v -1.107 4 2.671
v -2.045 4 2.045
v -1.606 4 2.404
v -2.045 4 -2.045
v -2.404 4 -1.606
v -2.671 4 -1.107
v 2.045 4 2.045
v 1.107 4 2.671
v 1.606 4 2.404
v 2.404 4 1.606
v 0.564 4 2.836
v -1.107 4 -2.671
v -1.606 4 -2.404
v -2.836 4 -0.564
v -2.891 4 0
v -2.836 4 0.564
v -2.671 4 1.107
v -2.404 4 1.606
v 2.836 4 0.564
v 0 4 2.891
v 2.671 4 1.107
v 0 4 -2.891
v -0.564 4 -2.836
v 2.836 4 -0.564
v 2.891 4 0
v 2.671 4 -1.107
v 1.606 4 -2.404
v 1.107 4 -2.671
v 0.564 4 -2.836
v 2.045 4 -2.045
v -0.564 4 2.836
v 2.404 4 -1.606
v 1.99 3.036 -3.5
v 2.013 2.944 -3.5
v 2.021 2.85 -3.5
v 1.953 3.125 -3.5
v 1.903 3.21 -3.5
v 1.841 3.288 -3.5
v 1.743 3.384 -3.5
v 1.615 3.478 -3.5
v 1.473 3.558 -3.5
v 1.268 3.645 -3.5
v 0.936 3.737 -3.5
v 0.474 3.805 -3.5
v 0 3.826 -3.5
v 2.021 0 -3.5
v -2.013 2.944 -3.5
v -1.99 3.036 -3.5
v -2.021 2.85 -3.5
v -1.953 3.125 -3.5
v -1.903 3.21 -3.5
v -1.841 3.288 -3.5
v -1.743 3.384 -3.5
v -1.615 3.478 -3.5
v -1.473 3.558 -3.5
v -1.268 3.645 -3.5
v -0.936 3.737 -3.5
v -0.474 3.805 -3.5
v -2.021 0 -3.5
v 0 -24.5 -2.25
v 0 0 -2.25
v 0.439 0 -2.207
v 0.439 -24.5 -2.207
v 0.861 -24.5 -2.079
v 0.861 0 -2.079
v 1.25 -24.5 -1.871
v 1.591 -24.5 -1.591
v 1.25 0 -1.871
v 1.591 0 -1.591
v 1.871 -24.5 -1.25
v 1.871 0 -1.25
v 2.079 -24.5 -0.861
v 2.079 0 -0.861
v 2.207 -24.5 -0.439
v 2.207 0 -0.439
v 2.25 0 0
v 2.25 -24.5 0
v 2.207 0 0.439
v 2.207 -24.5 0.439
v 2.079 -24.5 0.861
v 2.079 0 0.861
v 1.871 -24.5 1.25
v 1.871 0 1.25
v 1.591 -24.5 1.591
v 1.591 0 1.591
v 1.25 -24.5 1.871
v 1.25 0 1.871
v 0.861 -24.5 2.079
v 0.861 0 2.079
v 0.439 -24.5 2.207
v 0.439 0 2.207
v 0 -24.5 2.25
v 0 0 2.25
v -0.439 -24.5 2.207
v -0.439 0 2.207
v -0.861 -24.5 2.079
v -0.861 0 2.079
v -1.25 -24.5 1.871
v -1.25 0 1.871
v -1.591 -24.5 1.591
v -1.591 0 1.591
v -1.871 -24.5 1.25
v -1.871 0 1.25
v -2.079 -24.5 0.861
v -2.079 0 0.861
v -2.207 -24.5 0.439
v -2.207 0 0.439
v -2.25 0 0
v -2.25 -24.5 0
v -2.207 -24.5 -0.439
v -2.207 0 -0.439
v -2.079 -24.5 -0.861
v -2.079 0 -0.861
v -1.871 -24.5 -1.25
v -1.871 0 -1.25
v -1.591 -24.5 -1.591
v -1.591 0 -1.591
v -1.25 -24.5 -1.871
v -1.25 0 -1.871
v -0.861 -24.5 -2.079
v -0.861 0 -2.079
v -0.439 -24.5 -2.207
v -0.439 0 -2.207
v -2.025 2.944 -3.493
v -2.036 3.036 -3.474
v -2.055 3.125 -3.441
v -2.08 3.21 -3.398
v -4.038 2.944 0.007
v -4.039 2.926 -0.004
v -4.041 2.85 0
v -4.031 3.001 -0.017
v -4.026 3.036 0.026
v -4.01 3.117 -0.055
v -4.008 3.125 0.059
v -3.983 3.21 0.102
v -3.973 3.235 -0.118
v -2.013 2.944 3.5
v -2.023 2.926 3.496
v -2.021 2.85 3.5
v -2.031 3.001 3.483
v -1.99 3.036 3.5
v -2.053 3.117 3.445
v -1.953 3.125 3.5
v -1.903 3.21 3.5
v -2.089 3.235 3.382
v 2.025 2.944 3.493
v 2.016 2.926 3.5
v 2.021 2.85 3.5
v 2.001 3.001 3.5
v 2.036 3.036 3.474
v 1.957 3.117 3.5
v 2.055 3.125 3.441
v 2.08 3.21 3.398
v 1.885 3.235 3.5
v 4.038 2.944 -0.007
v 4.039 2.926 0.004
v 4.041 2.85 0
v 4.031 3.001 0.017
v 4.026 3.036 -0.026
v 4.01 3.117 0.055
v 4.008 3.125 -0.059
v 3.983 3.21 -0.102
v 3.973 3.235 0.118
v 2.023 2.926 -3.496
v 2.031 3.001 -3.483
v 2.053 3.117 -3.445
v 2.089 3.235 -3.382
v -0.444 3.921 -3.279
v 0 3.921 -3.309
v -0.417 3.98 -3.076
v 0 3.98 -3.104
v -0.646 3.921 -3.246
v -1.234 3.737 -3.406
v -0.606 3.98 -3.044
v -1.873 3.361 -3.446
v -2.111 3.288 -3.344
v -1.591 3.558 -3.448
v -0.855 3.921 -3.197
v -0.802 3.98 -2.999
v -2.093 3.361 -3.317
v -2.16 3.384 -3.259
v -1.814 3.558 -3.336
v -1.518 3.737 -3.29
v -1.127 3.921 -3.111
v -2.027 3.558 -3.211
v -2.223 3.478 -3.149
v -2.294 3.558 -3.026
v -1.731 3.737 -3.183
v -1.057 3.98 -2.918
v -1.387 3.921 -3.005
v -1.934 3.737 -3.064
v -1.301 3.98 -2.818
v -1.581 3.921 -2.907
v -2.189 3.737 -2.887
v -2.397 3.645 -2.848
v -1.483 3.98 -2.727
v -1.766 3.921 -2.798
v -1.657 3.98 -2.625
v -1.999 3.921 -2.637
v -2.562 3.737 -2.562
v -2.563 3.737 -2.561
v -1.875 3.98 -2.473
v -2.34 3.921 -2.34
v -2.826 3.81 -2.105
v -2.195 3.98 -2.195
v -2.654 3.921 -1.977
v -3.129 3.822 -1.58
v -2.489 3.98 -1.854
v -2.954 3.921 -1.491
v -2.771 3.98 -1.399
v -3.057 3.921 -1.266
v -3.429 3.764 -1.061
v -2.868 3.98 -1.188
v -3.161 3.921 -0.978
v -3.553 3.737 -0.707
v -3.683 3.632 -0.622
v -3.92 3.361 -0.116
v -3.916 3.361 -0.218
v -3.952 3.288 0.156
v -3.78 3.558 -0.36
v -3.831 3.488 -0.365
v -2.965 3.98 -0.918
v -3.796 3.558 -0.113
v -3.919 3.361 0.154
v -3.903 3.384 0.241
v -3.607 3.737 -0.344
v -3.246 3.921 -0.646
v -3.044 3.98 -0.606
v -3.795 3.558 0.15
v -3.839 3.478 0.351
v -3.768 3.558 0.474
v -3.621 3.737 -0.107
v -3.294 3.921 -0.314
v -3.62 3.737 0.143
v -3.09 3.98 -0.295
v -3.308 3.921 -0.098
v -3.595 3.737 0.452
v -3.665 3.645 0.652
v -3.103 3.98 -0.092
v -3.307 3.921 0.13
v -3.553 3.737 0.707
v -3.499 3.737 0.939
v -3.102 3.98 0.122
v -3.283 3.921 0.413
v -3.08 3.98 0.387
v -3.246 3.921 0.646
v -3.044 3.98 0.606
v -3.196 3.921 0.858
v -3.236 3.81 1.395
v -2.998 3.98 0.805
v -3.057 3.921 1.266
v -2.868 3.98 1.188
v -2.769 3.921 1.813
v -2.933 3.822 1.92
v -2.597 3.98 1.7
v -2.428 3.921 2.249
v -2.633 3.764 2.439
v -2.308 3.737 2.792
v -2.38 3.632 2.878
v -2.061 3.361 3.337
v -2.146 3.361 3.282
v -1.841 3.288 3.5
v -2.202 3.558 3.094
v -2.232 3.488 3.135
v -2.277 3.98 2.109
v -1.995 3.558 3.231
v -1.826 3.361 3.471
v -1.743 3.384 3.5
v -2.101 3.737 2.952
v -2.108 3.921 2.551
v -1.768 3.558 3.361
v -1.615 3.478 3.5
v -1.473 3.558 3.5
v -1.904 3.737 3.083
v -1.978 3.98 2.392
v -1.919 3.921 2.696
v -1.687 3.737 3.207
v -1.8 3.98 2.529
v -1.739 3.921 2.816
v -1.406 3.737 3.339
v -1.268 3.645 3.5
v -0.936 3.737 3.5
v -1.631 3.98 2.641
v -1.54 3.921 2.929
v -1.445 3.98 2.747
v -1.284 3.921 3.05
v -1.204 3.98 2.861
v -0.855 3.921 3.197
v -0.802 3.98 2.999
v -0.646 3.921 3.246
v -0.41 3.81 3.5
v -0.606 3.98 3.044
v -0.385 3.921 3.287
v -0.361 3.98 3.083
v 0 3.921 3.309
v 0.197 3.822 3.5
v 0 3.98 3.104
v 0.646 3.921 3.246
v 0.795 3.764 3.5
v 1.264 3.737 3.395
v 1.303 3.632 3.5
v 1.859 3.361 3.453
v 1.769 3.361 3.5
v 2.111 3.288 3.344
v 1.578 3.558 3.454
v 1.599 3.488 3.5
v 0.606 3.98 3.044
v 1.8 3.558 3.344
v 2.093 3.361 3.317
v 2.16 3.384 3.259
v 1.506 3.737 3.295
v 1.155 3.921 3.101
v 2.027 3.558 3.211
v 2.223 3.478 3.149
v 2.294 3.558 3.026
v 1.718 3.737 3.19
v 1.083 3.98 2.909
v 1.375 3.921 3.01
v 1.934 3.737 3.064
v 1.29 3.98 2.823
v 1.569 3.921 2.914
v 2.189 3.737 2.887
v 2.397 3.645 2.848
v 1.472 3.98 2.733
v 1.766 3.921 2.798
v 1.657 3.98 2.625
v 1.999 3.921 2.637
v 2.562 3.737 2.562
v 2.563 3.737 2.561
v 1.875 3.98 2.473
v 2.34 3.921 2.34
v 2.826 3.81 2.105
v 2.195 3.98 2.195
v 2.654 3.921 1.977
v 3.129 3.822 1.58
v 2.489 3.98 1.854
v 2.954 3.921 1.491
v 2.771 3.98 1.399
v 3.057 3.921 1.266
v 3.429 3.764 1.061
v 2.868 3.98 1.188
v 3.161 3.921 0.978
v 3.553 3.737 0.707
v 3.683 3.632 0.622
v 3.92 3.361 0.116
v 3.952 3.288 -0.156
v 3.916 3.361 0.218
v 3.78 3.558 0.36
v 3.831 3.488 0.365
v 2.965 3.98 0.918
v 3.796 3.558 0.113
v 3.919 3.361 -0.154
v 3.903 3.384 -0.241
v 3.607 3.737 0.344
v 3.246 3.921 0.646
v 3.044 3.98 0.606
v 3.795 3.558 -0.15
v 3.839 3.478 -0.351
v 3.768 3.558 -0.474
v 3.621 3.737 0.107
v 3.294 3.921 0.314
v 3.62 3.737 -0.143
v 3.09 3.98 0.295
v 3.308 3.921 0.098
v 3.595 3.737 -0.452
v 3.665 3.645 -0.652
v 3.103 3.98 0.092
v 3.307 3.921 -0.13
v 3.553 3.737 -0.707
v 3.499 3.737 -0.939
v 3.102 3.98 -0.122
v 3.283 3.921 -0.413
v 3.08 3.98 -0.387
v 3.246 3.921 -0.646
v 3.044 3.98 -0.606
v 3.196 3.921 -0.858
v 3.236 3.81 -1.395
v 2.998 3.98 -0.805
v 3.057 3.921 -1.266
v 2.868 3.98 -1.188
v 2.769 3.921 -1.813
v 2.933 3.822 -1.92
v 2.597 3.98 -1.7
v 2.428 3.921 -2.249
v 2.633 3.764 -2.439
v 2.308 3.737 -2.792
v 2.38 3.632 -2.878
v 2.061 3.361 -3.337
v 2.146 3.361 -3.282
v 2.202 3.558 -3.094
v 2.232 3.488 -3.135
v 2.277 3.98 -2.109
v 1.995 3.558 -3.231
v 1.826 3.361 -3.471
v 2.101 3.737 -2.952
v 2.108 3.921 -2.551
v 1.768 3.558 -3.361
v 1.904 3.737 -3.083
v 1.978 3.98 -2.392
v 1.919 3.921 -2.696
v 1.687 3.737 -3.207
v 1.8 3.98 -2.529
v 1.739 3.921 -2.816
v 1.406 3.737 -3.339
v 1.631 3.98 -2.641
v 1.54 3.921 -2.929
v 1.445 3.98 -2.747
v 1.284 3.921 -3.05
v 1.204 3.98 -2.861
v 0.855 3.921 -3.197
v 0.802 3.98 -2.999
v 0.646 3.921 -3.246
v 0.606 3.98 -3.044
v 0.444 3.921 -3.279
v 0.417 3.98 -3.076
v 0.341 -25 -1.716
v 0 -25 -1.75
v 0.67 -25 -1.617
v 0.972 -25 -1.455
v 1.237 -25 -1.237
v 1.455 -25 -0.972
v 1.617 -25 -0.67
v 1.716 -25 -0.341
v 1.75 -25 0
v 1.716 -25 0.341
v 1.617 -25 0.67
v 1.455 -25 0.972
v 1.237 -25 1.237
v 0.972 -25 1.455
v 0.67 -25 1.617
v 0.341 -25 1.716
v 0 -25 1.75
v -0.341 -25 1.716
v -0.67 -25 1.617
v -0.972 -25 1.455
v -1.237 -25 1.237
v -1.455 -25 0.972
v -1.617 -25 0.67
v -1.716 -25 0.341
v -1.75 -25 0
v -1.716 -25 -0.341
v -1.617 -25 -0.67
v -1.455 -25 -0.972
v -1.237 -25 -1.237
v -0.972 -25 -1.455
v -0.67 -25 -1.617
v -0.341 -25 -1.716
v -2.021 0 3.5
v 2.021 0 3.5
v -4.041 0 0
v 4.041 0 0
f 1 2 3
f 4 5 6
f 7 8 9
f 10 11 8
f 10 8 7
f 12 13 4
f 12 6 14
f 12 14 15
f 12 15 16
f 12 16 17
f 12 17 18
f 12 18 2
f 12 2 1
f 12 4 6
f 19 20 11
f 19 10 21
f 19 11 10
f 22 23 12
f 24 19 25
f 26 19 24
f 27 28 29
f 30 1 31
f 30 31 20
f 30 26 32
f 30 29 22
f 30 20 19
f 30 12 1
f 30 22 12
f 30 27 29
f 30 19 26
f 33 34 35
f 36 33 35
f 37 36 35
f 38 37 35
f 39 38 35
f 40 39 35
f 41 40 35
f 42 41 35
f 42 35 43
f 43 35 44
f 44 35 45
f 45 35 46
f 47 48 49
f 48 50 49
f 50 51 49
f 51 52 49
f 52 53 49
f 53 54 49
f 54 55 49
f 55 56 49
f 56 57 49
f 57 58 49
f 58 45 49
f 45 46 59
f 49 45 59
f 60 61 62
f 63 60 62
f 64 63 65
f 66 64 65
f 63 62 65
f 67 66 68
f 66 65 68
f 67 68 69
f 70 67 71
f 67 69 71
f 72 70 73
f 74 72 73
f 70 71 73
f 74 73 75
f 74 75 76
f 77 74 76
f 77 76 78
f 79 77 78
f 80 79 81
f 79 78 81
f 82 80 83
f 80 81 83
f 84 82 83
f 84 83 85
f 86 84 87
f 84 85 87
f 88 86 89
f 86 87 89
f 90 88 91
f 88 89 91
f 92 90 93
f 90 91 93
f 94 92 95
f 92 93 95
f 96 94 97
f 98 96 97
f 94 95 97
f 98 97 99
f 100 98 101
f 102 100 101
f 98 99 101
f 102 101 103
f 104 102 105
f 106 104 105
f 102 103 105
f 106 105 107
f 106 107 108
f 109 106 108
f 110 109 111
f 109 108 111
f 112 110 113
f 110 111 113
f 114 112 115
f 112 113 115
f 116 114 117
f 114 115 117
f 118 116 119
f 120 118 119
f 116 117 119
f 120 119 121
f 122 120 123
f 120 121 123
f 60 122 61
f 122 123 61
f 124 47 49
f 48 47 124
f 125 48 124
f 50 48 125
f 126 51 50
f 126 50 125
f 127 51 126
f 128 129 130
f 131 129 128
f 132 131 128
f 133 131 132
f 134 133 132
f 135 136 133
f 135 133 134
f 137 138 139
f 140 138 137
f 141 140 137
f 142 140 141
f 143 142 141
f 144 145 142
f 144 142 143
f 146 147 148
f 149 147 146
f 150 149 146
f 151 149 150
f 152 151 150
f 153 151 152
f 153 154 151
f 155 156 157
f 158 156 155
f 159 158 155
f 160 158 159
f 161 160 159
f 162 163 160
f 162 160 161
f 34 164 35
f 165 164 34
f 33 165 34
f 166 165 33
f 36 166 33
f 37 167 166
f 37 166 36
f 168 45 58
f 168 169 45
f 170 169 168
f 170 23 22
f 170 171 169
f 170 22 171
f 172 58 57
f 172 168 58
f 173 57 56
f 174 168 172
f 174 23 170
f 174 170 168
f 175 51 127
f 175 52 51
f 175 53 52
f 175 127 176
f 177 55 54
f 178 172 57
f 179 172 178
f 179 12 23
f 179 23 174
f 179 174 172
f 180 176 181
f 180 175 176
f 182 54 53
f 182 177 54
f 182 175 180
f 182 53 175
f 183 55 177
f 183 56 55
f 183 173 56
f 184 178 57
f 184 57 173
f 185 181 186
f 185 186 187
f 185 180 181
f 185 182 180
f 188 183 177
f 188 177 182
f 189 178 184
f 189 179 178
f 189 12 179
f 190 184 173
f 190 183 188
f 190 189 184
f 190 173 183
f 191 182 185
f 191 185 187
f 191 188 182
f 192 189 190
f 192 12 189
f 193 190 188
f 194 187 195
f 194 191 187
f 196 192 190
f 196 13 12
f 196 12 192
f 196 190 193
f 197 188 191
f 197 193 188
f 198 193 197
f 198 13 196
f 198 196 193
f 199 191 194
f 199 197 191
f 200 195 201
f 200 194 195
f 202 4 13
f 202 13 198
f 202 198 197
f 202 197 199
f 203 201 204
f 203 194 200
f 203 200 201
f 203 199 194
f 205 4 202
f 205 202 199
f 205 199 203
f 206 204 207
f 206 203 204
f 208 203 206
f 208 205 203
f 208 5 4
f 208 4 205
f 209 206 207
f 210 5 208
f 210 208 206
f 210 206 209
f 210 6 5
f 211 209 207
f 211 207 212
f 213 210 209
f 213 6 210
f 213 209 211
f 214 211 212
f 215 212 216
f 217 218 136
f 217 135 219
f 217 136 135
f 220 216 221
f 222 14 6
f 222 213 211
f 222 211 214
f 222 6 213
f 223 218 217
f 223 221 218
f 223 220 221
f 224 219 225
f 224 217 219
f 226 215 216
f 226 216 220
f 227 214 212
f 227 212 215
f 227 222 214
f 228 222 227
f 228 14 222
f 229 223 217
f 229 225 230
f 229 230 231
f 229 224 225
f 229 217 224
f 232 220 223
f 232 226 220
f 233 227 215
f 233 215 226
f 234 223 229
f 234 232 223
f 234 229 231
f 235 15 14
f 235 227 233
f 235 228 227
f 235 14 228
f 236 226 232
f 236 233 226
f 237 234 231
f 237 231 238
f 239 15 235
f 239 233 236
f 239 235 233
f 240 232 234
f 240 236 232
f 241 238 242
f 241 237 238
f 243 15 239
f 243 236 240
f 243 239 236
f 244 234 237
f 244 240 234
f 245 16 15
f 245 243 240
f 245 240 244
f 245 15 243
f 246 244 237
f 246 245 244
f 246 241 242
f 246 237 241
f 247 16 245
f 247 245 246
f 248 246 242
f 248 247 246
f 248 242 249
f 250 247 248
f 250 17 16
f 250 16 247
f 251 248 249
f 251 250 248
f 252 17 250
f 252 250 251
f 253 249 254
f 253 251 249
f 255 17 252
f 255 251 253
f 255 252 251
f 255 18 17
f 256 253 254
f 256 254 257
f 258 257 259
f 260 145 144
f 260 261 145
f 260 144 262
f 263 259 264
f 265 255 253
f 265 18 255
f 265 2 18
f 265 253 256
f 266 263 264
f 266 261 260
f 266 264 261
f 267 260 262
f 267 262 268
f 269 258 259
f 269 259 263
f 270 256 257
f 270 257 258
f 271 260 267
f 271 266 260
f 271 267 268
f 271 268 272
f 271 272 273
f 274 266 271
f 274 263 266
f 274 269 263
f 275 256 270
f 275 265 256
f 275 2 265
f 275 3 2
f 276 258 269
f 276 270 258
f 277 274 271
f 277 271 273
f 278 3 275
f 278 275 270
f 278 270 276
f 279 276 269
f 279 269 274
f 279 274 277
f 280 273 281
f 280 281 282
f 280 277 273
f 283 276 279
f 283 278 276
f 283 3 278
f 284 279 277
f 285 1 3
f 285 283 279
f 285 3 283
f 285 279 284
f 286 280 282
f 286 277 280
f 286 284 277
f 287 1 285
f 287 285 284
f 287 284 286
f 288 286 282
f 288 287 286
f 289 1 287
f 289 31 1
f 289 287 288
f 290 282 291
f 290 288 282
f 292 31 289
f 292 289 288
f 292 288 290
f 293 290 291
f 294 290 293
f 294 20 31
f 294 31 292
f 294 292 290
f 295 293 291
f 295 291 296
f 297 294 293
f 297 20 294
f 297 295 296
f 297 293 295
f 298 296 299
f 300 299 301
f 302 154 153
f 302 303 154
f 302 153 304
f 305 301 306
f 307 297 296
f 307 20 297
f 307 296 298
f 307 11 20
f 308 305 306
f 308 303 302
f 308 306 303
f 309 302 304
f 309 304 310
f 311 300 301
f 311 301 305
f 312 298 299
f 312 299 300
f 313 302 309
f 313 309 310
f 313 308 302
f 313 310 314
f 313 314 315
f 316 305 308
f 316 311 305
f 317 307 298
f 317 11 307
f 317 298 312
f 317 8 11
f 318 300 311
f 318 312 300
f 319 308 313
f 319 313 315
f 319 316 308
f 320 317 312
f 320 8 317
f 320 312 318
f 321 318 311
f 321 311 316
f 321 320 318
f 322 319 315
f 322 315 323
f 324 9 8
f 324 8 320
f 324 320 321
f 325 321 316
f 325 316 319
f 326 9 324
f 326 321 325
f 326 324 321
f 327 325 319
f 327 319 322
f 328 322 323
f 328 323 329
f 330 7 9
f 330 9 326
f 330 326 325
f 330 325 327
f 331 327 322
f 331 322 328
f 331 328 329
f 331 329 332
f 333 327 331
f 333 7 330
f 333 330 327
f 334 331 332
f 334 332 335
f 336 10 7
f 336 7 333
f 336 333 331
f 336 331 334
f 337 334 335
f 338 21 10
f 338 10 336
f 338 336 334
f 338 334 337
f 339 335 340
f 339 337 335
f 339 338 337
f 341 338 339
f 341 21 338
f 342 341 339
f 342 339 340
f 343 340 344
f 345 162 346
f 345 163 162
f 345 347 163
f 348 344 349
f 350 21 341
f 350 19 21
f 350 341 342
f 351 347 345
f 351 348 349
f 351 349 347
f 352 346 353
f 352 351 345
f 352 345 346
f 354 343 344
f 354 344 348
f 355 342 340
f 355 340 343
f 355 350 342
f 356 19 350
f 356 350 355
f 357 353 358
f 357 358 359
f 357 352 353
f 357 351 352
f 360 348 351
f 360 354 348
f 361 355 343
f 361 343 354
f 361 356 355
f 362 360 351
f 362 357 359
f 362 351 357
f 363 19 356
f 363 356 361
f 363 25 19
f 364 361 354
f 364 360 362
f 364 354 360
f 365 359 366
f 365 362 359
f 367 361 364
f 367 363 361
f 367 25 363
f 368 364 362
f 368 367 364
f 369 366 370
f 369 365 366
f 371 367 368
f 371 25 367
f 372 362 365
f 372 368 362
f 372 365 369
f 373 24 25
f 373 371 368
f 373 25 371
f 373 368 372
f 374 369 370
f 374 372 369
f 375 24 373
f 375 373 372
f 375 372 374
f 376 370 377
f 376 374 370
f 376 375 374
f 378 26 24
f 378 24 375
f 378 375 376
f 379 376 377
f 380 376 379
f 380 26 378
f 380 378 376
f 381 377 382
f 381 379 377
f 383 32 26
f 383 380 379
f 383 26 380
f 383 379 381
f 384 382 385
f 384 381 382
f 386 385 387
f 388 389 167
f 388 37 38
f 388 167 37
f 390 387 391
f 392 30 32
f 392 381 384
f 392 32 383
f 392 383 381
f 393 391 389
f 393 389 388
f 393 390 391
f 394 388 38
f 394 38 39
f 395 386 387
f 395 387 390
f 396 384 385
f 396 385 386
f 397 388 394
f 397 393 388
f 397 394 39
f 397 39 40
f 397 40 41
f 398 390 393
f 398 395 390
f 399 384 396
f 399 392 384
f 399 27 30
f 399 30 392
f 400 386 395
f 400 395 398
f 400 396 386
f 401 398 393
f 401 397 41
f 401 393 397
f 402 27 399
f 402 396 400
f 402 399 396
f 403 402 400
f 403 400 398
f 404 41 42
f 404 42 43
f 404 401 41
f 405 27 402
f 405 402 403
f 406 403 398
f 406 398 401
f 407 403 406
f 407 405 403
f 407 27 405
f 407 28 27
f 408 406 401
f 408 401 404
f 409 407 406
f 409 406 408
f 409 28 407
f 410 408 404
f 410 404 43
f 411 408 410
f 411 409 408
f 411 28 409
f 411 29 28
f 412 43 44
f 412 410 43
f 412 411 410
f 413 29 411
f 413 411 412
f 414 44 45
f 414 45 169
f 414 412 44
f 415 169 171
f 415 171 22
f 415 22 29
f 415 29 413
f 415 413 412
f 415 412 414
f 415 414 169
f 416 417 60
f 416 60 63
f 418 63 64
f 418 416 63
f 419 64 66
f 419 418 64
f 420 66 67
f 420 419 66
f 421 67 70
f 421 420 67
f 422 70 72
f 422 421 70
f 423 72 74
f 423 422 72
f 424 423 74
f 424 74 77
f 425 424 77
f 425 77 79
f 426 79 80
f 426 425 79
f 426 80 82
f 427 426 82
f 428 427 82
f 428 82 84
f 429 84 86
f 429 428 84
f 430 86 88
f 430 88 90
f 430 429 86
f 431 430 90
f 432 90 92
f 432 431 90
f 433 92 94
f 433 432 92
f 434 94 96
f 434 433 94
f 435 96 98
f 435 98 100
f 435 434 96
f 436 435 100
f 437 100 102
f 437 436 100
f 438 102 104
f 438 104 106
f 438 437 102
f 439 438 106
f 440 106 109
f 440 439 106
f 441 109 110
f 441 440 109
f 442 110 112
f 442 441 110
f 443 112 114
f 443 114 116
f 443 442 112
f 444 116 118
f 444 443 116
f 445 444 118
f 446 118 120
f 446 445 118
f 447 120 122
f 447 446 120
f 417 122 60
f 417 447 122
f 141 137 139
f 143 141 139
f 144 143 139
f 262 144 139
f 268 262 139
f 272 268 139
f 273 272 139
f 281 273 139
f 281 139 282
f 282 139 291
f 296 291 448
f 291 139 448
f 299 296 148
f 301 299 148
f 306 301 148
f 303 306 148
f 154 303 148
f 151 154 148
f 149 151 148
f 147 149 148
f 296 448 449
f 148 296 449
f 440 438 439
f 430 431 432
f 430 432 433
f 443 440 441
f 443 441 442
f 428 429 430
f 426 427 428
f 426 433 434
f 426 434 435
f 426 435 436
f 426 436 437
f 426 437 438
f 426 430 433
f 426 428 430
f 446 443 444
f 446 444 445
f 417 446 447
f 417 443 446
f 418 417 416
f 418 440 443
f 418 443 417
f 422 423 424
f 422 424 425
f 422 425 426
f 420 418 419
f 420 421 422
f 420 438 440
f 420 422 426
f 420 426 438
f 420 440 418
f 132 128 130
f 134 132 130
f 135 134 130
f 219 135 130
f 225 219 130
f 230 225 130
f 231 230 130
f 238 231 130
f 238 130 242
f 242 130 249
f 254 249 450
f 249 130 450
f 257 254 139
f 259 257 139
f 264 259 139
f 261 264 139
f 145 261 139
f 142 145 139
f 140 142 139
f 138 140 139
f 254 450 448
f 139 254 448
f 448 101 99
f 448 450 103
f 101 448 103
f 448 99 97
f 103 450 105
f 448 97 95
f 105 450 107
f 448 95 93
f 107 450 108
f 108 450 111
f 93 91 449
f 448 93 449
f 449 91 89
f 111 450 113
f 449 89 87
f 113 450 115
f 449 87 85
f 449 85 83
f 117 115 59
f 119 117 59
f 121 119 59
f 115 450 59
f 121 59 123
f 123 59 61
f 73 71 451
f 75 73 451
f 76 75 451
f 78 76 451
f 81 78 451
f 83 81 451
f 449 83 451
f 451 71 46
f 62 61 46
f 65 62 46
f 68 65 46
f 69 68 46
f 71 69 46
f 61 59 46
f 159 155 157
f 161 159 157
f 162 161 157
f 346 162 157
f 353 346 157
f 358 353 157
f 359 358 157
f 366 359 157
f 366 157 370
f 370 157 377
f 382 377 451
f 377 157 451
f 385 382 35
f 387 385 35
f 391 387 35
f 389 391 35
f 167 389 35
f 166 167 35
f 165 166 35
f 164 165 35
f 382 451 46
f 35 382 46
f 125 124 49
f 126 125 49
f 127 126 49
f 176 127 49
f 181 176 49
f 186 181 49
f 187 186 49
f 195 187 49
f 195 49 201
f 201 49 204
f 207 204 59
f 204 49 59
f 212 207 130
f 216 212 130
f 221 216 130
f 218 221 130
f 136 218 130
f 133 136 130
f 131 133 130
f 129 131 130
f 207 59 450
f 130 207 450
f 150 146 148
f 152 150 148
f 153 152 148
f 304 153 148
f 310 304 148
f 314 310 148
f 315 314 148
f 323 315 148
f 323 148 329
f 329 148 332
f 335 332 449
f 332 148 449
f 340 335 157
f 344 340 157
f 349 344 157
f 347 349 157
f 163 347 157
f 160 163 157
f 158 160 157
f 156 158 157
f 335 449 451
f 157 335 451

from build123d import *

# Parameters (mm, degrees)
BOSS_EXTRUDE1_DEPTH = 4
SKETCH2_R           = 2.25
BOSS_EXTRUDE2_DEPTH = 25
CHAMFER1_SIZE       = 0.5


with BuildPart() as part:
    # Sketch1 → Boss-Extrude1 (new body)
    with BuildSketch(Plane(origin=(0, 0, 0), x_dir=(1, 0, 0), z_dir=(0, 1, 0))):
        Polygon((4.041451884, 0), (2.020725942, 3.5), (-2.020725942, 3.5), (-4.041451884, 0), (-2.020725942, -3.5), (2.020725942, -3.5), align=None)
    extrude(amount=BOSS_EXTRUDE1_DEPTH)

    # Sketch2 → Boss-Extrude2 (add)
    with BuildSketch(Plane.XZ):
        with Locations(Location((0, 0, 0), (0, 0, 270))):
            Circle(SKETCH2_R)
    extrude(amount=BOSS_EXTRUDE2_DEPTH)

    # Chamfer1
    chamfer1_edges = [part.edges().sort_by_distance(p)[0] for p in [
        (0, -25, 2.25),
    ]]
    chamfer(chamfer1_edges, length=CHAMFER1_SIZE)

    # Sketch3 → Cut-Revolve1 (revolve, cut)
    with BuildSketch(Plane.XY, mode=Mode.PRIVATE) as cut_revolve1_sk:
        with BuildLine():
            Line((2.891451884, 4), (4.041451884, 4))
            Line((4.041451884, 4), (4.041451884, 2.85))
            ThreePointArc((4.041451884, 2.85), (3.704624683, 3.663172798), (2.891451884, 4))
        make_face()
    revolve(cut_revolve1_sk.sketch.rotate(Axis((0, 0, 0), (0, 1, 0)), 90), axis=Axis((0, 0, 0), (0, 1, 0)), mode=Mode.SUBTRACT)


solid = part.part
